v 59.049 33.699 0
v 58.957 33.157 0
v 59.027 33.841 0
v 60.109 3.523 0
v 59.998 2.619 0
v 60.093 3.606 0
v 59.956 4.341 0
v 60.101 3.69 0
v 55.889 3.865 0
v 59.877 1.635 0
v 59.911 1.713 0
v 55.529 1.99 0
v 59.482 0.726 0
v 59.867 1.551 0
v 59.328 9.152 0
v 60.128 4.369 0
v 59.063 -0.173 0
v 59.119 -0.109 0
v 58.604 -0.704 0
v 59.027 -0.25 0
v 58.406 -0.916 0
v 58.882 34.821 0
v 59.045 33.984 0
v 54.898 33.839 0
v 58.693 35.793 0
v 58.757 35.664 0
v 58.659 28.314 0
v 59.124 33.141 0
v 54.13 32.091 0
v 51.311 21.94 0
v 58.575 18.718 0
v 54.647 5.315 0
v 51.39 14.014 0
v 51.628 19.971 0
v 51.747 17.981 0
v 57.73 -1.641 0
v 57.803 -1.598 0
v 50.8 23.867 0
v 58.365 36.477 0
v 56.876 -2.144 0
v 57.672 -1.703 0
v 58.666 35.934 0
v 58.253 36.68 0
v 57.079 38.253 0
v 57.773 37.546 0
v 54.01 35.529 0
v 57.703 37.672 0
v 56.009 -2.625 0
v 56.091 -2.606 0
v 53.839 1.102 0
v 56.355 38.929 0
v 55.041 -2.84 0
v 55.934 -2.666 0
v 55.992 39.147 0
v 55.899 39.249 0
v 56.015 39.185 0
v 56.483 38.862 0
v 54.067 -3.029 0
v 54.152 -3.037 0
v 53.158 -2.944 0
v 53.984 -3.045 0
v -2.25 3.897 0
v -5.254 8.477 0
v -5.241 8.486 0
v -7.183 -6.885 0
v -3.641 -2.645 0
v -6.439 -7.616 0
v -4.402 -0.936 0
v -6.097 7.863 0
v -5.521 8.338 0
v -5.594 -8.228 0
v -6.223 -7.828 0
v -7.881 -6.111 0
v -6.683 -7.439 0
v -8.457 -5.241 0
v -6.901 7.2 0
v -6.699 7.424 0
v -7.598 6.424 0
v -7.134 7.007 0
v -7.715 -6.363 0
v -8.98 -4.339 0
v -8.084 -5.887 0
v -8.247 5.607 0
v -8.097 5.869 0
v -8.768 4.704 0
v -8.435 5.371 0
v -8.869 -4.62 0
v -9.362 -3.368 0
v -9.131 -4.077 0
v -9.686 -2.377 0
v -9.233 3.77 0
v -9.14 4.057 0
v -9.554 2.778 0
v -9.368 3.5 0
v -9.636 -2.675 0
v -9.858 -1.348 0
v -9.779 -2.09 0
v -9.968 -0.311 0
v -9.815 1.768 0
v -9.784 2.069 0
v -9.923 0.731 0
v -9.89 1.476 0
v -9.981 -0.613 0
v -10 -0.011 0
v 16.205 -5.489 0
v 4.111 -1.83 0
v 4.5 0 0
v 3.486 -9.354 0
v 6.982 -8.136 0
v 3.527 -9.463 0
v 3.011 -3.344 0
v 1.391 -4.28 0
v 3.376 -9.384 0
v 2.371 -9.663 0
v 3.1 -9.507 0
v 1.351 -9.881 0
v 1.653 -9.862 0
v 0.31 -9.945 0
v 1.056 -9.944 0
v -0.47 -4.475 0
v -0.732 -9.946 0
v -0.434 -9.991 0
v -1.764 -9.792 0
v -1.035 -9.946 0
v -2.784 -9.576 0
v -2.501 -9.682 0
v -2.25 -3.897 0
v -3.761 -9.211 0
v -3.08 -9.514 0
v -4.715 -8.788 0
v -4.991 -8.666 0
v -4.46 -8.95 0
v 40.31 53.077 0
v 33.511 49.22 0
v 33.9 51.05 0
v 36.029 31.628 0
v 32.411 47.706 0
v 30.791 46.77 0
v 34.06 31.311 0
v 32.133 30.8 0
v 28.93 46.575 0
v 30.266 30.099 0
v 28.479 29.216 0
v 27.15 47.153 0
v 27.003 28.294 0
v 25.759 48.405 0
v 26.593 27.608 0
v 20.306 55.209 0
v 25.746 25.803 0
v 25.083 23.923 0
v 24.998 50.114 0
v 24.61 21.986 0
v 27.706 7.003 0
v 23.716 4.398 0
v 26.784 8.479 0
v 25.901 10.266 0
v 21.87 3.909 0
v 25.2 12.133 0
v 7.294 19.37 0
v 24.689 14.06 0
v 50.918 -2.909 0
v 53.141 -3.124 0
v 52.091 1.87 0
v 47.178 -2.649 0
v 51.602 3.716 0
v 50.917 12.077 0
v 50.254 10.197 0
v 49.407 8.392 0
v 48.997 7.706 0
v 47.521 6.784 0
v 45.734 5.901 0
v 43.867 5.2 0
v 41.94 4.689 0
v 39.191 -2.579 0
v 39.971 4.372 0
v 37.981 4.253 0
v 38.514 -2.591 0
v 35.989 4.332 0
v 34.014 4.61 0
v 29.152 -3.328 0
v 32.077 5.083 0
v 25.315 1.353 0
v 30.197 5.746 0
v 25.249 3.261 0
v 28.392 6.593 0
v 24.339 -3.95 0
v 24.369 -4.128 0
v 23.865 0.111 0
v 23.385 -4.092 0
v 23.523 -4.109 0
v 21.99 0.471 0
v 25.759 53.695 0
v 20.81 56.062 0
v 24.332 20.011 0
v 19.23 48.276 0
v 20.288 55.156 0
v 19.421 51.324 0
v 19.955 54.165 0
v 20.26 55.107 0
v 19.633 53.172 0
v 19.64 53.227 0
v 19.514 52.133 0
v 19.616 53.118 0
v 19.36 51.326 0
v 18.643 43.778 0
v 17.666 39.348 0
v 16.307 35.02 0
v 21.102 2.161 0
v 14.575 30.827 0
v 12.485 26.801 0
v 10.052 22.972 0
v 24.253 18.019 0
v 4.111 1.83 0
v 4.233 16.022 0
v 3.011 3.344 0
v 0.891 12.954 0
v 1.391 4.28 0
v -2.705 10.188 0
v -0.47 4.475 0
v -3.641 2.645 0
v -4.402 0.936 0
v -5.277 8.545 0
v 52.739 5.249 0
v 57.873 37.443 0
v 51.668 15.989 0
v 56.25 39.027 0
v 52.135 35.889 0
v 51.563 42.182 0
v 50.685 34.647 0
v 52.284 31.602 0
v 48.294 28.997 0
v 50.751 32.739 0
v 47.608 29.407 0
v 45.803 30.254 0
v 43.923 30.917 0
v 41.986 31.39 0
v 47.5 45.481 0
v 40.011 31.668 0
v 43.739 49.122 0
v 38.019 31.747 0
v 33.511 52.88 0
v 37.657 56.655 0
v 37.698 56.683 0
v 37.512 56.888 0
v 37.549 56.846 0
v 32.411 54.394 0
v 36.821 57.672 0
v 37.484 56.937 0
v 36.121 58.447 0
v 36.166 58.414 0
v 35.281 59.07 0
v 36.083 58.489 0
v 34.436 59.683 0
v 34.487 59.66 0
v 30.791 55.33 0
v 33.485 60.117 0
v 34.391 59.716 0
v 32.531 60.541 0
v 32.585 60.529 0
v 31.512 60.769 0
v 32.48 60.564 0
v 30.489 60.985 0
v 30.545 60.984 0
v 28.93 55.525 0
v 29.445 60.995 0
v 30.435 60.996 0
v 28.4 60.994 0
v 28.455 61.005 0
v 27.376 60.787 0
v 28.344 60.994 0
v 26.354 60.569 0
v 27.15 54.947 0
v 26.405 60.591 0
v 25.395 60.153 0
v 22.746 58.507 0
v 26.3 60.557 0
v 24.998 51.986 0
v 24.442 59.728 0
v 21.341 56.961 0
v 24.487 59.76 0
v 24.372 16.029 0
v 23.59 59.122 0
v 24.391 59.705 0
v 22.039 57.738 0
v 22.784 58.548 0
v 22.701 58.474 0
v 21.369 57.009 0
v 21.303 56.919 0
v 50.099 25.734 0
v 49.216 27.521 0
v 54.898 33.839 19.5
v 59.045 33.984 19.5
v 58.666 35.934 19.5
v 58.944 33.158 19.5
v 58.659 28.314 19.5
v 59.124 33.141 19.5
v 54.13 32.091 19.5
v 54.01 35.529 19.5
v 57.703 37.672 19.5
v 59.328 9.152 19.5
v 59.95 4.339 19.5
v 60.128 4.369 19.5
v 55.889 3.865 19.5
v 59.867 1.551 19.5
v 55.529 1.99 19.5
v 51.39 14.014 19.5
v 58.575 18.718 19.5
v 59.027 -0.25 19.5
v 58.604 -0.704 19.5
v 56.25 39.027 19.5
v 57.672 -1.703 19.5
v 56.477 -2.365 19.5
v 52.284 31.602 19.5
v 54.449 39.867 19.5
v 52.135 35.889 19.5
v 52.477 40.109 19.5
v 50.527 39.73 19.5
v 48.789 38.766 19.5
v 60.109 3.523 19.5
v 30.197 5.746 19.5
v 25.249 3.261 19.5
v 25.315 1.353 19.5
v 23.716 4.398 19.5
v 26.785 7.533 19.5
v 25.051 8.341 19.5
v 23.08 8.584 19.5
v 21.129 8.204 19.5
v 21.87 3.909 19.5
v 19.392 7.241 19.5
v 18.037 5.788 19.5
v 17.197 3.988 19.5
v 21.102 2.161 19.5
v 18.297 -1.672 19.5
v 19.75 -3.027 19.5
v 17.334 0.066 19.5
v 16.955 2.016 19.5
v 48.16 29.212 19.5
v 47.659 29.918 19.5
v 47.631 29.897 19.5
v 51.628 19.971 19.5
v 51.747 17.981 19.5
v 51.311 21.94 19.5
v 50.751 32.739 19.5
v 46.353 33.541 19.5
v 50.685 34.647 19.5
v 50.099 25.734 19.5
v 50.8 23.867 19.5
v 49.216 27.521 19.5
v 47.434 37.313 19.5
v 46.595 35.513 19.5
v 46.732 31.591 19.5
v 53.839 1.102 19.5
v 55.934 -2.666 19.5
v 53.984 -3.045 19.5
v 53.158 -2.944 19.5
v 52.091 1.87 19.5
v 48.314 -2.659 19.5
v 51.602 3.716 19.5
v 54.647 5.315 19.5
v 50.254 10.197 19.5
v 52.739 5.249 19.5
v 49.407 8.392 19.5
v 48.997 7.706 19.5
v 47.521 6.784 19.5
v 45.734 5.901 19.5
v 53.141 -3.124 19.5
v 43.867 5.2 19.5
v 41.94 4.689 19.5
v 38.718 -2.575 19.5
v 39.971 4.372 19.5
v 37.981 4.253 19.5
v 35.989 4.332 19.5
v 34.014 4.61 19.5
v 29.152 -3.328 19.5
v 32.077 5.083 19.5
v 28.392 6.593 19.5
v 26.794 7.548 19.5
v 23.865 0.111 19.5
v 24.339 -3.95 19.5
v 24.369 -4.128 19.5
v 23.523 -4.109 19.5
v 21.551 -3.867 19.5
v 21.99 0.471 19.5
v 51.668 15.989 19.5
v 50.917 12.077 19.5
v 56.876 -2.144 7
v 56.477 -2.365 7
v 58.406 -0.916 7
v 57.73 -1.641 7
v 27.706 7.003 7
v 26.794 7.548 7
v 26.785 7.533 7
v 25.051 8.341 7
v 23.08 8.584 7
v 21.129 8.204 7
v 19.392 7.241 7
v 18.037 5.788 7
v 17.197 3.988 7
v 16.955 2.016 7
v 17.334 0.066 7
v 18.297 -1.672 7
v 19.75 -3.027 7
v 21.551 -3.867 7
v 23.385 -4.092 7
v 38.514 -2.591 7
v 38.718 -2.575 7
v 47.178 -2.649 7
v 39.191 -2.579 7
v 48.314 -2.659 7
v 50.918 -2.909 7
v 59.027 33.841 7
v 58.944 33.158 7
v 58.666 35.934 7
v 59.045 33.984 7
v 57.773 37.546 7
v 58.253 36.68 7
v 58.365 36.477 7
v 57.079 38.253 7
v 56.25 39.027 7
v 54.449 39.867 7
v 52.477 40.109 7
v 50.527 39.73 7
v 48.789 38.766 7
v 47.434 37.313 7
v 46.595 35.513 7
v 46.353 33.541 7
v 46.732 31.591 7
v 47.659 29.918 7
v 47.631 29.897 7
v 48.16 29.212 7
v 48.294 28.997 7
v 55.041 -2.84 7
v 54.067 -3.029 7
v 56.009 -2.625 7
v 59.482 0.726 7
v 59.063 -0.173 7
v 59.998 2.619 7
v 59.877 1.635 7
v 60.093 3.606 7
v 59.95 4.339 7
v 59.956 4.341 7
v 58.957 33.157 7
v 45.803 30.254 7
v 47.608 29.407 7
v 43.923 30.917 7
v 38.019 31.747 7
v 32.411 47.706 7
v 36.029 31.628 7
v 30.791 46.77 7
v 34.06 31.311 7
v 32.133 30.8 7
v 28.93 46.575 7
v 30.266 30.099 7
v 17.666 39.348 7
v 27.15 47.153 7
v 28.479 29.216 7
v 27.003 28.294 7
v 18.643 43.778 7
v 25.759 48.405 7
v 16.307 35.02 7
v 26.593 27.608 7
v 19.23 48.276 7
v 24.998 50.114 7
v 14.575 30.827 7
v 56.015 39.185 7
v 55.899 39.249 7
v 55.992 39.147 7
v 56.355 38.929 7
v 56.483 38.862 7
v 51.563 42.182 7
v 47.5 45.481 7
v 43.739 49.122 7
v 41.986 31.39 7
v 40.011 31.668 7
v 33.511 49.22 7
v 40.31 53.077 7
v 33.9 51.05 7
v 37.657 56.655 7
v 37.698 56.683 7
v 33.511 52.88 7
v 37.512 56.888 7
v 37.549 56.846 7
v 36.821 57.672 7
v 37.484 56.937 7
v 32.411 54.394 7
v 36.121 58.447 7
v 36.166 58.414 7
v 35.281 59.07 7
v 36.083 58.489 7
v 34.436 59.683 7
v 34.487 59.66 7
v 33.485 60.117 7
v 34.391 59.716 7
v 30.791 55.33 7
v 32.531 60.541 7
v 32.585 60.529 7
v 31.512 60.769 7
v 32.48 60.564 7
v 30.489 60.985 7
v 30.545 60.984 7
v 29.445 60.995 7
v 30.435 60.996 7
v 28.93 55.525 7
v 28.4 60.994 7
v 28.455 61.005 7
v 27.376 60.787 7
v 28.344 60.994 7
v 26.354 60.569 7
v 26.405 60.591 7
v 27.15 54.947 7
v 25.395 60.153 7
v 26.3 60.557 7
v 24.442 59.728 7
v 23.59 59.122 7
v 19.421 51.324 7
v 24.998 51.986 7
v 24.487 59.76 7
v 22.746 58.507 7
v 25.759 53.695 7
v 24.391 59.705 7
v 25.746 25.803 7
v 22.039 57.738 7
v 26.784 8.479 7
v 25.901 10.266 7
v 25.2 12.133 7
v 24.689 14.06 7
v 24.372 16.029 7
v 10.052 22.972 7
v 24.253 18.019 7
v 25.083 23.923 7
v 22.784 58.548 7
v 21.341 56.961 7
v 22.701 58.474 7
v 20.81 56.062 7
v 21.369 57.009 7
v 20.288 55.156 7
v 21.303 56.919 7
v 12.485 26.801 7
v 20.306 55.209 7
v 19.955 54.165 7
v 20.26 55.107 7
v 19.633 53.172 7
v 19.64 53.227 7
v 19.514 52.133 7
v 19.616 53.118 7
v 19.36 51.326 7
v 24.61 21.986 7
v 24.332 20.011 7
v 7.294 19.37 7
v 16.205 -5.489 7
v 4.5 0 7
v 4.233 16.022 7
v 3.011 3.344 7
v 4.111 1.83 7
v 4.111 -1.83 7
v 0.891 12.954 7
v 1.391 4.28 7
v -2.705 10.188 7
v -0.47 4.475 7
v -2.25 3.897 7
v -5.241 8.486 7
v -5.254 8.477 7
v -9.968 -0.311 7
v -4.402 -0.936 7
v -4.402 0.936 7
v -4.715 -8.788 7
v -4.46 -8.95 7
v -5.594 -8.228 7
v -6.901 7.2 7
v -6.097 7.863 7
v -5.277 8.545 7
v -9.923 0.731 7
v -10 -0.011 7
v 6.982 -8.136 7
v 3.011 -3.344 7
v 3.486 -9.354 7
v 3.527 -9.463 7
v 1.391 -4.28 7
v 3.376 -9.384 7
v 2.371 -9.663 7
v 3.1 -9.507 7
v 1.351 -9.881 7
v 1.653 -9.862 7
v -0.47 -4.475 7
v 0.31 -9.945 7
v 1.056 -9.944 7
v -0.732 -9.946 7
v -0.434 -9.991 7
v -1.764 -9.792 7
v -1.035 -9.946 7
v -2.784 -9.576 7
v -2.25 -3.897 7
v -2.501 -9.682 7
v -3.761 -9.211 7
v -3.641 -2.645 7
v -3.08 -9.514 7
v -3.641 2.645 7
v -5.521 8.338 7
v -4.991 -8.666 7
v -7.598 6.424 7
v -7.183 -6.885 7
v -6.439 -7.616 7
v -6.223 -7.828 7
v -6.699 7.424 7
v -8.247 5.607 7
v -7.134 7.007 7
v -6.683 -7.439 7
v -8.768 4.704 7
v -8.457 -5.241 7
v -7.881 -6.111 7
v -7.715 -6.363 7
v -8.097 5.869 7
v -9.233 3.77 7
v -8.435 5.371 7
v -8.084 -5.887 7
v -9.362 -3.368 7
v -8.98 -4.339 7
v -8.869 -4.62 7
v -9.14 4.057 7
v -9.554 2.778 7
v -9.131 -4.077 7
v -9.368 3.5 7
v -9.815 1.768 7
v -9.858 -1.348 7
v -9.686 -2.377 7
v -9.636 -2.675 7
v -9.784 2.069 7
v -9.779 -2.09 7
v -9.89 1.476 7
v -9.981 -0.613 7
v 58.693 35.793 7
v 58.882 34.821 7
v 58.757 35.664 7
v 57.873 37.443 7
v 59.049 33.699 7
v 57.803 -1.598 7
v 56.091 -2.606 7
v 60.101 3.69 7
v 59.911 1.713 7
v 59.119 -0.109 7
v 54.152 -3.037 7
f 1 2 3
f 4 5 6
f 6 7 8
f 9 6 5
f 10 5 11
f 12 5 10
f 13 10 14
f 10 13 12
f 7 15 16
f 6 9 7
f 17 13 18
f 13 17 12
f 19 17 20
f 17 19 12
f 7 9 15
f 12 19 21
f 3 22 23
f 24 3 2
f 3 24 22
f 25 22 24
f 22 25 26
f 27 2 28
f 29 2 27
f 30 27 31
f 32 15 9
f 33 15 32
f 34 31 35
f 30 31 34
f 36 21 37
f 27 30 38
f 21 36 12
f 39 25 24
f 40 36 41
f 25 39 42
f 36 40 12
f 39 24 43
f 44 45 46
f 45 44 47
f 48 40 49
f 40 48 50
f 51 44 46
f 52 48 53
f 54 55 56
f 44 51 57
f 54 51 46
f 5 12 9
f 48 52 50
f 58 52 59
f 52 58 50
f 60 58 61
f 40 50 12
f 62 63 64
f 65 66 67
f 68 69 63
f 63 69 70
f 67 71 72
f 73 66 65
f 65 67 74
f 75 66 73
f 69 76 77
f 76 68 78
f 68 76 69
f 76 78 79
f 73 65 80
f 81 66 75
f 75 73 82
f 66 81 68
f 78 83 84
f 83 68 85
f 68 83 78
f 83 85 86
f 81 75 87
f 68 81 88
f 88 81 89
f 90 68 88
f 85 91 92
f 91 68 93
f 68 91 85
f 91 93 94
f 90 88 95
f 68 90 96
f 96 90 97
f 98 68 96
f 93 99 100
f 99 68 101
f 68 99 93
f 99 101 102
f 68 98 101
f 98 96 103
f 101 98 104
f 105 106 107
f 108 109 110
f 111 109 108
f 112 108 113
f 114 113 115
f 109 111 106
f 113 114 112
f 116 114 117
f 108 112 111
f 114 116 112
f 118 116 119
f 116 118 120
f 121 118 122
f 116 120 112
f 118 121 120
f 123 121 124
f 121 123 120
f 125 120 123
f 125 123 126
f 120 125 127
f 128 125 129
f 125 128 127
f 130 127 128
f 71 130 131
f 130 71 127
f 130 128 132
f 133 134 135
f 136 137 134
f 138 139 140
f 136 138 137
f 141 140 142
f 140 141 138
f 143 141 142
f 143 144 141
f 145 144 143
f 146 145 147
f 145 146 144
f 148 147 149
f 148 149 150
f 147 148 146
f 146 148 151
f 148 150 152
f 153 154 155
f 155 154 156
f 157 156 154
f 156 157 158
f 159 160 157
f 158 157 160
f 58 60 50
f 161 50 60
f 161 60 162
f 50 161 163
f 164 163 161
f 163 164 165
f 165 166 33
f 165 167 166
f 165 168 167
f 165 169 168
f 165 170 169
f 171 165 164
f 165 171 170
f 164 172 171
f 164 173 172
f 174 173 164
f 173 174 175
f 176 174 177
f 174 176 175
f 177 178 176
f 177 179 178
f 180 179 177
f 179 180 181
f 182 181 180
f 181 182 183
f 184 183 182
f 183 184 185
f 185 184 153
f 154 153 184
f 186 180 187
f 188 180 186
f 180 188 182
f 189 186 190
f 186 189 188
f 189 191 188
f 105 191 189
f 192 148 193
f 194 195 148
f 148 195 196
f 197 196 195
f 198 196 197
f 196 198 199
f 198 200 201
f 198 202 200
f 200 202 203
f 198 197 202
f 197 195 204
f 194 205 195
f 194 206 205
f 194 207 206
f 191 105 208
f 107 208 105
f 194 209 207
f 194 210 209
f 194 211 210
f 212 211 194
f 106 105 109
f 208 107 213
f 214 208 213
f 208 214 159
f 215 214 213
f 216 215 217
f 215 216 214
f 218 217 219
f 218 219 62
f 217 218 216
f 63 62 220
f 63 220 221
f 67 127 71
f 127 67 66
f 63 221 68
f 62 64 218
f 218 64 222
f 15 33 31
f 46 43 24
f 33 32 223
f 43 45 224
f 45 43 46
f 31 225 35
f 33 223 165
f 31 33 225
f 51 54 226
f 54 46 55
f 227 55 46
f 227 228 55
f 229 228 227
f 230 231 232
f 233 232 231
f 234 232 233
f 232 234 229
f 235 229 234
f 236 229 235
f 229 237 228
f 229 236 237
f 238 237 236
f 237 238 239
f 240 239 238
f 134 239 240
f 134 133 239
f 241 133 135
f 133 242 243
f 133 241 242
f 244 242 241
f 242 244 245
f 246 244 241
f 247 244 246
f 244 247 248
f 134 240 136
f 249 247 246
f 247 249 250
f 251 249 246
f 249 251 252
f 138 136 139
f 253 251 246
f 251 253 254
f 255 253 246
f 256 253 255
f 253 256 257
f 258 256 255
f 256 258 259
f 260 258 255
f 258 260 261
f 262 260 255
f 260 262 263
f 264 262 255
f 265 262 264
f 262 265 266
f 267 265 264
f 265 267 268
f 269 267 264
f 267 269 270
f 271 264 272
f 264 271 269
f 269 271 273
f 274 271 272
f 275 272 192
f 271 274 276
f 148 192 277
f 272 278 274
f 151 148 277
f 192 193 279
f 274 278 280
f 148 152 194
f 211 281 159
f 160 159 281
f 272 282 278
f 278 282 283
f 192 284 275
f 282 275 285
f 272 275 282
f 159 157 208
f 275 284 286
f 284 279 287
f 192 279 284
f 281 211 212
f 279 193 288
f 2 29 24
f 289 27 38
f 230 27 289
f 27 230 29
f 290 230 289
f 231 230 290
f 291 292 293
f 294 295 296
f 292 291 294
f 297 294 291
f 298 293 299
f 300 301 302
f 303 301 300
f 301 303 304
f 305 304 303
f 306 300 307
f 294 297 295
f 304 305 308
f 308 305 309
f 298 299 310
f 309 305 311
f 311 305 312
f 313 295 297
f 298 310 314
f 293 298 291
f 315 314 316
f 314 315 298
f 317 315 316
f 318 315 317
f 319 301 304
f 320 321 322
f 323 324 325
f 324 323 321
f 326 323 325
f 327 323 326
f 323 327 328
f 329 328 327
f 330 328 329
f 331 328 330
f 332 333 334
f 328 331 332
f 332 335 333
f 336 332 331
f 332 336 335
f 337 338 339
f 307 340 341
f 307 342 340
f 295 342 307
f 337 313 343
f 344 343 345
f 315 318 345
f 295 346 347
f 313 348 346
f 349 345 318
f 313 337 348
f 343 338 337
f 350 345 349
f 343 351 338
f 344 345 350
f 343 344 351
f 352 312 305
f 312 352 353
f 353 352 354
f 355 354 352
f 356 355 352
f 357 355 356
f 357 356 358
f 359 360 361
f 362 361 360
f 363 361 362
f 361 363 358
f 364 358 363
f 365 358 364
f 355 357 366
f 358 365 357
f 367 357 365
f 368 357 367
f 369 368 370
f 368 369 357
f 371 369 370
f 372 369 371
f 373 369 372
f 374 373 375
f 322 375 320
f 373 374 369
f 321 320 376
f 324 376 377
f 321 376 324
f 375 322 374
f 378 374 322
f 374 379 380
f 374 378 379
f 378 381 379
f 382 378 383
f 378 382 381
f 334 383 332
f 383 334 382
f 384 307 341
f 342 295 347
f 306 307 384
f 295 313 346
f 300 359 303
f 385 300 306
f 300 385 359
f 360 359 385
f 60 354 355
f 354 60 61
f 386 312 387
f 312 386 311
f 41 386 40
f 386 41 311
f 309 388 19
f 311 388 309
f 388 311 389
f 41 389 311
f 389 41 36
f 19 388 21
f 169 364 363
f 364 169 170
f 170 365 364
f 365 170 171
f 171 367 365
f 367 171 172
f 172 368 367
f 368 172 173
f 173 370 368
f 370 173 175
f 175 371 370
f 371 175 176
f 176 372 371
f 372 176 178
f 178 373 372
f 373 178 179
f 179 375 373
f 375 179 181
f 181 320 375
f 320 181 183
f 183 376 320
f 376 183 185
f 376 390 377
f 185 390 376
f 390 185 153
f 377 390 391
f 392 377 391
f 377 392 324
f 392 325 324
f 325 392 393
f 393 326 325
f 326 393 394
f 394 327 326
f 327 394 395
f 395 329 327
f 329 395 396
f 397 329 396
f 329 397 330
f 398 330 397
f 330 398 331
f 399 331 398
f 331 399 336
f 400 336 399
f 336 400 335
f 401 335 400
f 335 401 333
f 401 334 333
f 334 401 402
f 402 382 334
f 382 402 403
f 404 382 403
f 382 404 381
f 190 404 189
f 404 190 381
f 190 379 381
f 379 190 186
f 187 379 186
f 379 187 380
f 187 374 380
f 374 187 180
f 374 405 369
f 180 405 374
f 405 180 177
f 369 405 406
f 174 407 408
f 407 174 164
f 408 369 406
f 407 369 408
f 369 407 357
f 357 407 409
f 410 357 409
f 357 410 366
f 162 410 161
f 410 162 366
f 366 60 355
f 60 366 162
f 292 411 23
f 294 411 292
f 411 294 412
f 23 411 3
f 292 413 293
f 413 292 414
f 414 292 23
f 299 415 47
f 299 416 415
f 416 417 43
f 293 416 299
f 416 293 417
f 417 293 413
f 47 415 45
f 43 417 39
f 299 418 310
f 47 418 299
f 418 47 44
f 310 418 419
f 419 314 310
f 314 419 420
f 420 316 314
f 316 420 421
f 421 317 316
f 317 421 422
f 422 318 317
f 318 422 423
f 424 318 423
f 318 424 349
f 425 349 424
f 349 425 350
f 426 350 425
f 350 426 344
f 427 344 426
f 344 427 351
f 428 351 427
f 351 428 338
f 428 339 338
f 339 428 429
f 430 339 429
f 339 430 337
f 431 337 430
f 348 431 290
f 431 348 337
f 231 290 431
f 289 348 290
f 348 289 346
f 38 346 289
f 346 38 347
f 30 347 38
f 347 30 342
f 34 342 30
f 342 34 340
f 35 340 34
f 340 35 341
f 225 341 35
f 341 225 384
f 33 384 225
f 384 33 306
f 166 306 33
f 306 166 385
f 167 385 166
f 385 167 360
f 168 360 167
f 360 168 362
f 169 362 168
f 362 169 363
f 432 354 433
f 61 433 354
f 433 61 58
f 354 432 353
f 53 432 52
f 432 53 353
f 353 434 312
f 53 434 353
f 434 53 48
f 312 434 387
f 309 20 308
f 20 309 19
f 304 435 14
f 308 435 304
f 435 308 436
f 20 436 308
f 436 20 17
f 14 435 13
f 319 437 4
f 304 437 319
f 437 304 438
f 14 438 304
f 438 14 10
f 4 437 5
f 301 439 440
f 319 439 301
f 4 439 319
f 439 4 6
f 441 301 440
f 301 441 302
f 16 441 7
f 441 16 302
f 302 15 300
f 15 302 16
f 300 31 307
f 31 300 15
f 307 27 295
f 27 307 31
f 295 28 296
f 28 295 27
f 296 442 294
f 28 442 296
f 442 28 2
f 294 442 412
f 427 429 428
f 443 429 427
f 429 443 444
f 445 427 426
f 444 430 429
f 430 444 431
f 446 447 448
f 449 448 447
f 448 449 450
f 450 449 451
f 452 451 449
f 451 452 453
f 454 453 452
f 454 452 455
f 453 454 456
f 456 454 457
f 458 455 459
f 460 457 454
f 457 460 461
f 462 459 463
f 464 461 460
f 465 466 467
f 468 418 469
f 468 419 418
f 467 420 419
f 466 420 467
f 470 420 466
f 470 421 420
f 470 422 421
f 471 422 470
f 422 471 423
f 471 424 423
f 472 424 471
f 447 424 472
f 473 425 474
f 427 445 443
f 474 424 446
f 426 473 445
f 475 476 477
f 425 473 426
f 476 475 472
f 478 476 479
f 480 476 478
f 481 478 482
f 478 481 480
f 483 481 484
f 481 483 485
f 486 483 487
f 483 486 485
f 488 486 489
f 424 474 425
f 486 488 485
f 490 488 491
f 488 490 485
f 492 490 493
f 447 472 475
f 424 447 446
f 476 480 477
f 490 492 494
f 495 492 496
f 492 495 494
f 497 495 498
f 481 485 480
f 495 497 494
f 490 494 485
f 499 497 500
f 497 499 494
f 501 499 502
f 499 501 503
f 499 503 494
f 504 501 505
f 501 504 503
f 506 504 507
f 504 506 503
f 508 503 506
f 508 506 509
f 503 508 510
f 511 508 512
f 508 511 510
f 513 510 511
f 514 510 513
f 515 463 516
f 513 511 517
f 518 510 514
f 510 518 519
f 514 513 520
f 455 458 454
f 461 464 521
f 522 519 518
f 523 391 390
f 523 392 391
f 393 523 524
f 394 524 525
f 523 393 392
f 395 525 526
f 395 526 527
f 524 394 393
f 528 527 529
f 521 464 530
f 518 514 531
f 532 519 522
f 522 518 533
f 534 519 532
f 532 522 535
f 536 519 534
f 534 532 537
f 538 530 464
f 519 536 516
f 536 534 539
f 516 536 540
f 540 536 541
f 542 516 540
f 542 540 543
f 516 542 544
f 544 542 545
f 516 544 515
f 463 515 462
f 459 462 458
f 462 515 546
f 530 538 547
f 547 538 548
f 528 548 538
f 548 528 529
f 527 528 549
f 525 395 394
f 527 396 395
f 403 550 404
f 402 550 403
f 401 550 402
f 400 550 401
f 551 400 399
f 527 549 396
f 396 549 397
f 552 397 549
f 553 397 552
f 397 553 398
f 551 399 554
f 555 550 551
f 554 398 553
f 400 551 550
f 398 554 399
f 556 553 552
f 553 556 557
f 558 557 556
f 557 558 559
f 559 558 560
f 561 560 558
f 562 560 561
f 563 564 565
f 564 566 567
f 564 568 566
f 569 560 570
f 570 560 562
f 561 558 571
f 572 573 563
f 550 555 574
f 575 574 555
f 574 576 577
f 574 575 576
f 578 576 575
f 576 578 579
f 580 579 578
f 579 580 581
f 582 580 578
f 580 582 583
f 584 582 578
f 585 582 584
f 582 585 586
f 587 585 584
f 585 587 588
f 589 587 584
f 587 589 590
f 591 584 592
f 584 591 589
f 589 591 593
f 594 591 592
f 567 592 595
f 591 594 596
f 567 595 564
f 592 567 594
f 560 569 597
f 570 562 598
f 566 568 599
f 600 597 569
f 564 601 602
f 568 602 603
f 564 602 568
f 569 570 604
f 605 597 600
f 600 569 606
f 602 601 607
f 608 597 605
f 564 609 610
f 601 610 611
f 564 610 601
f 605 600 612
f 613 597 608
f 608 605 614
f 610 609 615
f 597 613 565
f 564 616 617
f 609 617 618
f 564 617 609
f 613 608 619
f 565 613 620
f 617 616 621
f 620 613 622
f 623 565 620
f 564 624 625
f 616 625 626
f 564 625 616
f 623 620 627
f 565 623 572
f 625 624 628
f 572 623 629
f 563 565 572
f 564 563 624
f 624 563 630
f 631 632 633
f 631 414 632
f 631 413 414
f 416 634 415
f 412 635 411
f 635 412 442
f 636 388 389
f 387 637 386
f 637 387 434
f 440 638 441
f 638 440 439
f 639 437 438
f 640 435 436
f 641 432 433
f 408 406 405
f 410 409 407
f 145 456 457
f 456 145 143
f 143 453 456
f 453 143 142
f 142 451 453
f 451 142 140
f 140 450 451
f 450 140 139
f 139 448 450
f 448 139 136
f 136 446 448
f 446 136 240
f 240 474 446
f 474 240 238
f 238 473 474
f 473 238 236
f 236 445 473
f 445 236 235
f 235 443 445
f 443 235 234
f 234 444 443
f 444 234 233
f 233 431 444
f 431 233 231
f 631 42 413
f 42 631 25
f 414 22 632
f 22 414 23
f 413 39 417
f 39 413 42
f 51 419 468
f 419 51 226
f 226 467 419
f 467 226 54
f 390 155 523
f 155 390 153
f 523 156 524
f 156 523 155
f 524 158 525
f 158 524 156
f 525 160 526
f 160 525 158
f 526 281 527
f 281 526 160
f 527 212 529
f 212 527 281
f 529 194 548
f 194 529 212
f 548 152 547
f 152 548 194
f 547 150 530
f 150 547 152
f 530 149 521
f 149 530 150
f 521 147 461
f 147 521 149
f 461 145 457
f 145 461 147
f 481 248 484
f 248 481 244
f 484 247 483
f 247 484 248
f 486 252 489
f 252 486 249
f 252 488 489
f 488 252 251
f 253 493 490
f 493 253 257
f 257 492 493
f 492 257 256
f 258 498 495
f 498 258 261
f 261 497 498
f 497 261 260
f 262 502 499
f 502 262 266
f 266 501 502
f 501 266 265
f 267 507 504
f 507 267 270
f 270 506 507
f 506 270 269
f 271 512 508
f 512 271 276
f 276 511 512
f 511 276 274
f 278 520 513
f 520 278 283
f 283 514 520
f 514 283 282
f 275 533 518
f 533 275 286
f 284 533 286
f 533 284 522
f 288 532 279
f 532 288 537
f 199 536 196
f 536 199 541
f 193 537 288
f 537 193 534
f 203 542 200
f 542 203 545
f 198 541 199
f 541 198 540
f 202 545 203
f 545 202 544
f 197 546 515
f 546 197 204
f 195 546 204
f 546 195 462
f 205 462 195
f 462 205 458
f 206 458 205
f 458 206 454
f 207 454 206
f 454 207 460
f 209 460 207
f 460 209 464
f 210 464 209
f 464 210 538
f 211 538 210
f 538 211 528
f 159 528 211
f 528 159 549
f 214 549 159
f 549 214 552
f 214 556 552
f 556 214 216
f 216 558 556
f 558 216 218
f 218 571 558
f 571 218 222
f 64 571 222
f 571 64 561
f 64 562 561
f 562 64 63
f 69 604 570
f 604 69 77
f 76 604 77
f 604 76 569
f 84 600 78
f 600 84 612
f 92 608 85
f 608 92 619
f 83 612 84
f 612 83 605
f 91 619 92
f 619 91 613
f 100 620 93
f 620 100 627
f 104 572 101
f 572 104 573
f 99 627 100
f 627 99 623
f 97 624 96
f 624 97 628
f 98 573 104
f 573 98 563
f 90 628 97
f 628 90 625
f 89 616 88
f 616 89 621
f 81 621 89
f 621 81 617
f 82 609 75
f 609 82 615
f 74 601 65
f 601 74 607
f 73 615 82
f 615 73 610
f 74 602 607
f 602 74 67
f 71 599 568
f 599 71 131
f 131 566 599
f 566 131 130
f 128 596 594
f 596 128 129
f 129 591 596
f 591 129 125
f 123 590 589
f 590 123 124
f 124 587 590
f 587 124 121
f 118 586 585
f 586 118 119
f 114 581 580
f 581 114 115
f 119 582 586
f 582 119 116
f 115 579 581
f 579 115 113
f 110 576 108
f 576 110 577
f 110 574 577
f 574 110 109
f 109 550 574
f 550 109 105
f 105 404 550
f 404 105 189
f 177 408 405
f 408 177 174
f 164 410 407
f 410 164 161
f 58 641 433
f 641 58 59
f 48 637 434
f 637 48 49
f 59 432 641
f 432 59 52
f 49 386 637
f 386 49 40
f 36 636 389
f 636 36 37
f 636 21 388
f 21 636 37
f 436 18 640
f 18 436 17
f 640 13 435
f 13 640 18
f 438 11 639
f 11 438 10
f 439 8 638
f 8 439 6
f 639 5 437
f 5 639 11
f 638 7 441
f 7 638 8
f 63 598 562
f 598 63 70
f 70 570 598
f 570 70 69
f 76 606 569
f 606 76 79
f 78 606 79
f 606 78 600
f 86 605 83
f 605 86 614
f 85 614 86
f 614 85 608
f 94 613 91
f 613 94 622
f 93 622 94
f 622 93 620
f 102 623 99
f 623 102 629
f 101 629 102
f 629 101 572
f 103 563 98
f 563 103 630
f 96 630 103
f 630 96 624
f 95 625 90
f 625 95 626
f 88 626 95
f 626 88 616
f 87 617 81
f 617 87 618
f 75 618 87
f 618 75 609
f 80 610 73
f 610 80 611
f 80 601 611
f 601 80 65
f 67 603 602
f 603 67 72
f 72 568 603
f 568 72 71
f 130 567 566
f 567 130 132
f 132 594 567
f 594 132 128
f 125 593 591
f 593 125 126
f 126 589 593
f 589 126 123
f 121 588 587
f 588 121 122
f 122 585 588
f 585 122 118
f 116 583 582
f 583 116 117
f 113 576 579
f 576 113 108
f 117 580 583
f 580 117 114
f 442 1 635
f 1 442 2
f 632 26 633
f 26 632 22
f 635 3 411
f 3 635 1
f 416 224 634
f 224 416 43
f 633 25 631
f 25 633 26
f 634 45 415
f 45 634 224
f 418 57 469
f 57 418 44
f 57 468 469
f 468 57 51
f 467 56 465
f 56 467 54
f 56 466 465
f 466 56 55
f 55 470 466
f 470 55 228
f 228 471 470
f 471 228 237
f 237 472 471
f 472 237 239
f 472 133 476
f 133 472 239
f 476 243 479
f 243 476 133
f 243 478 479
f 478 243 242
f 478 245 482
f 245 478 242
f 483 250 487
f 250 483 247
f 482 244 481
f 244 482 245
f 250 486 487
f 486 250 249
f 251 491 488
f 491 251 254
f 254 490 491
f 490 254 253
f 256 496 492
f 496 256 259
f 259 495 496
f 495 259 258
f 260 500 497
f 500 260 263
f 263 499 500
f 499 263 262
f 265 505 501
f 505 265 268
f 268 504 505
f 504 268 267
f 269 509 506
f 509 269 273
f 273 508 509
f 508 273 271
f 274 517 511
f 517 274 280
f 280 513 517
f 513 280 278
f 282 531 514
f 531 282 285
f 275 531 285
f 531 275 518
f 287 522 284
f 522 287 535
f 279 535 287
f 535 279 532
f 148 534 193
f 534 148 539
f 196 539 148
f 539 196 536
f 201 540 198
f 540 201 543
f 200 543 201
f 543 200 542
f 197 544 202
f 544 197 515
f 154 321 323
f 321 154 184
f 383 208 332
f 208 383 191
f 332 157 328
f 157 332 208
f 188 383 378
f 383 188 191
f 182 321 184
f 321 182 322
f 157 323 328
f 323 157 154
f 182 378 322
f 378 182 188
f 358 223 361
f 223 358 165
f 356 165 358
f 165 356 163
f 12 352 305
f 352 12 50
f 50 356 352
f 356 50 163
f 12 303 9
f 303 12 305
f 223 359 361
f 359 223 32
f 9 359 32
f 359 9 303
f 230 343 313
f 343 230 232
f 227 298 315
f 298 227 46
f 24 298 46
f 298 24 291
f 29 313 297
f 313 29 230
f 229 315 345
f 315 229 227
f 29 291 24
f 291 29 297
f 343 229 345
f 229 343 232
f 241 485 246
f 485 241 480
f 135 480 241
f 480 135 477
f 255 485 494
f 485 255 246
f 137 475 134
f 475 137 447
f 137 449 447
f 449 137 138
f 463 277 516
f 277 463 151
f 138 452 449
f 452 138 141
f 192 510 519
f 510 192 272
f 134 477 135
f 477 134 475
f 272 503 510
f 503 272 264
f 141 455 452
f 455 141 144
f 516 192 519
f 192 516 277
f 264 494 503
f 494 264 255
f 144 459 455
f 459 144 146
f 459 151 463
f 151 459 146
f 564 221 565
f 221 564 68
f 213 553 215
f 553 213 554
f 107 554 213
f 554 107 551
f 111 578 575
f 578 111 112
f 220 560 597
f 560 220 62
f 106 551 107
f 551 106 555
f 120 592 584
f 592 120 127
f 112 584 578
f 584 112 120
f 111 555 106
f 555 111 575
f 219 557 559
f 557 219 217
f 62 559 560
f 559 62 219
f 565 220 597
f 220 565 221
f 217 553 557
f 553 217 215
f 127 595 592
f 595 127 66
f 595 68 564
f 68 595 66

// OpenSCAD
// file: functions.scad
// PRUSA Mendel  
// Functions used in many files
// GNU GPL v3
// Josef Průša
// josefprusa@me.com
// prusadjs.cz
// http://www.reprap.org/wiki/Prusa_Mendel
// http://github.com/prusajr/PrusaMendel


module nut(d,h,horizontal=true){
cornerdiameter =  (d / 2) / cos (180 / 6);
cylinder(h = h, r = cornerdiameter, $fn = 6);
if(horizontal){
for(i = [1:6]){
	rotate([0,0,60*i]) translate([-cornerdiameter-0.2,0,0]) rotate([0,0,-45]) cube(size = [2,2,h]);
}}
}

// Based on nophead research
module polyhole(d,h) {
    n = max(round(2 * d),3);
    rotate([0,0,180])
        cylinder(h = h, r = (d / 2) / cos (180 / n), $fn = n);
}




module roundcorner(diameter){
	difference(){
		cube(size = [diameter,diameter,99], center = false);
		translate(v = [diameter, diameter, 0]) cylinder(h = 100, r=diameter, center=true);
	}
}
// file: metric.scad
// PRUSA Mendel  
// Default metric sizes
// GNU GPL v3
// Josef Průša
// josefprusa@me.com
// prusadjs.cz
// http://www.reprap.org/wiki/Prusa_Mendel
// http://github.com/prusajr/PrusaMendel

// DONT CHANGE THIS FILE! ALTER VALUES IN CONFIGURATION.SCAD INSTEAD

// RODS

threaded_rod_diameter = 8.7;
threaded_rod_diameter_horizontal = 8.7;
smooth_bar_diameter = 8;
smooth_bar_diameter_horizontal = 8.5;

// Nuts and bolts

m8_diameter = 9;
m8_nut_diameter = 14.1;

m4_diameter = 4.5;
m4_nut_diameter = 9;

m3_diameter = 3.6;
m3_nut_diameter = 5.3;
m3_nut_diameter_horizontal = 6.1;

// Bushing holder

bushing_core_diameter = smooth_bar_diameter;
bushing_material_thickness = 1;

// Motors

motor_shaft = 5.5;
// file: configuration.scad
// PRUSA Mendel  
// Configuration file
// GNU GPL v3
// Josef Průša
// josefprusa@me.com
// prusadjs.cz
// http://www.reprap.org/wiki/Prusa_Mendel
// http://github.com/prusajr/PrusaMendel

// PLEASE SELECT ONE OF THE CONFIGURATIONS BELOW
// BY UN-COMMENTING IT

// Uncomment for metric settings
// METRIC METRIC METRIC METRIC METRIC METRIC METRIC METRIC 

include <metric.scad>;

// CUSTOM CUSTOM CUSTOM CUSTOM CUSTOM CUSTOM CUSTOM CUSTOM CUSTOM

thin_wall = 3;


// Linear bearing version
linear = false;
// set false for LM-8UU, true for LM-E-8UU (ignore if linear is set to false)
lme8uu = false;



// CHANGE ONLY THE STUFF YOU KNOW
// IT WILL REPLACE DEFAULT SETTING

// RODS

// threaded_rod_diameter = 0;
// threaded_rod_diameter_horizontal = 0;
// smooth_bar_diameter = 0;
// smooth_bar_diameter_horizontal = 0;

// Nuts and bolts

// m8_diameter = 0;
// m8_nut_diameter = 0;

// m4_diameter = 0;
// m4_nut_diameter = 0;

// m3_diameter = 0;
// m3_nut_diameter = 0;

// Bushing holder

// bushing_core_diameter = smooth_bar_diameter;
// bushing_material_thickness = 0;


///counted stuff
m3_nut_diameter_bigger = ((m3_nut_diameter  / 2) / cos (180 / 6))*2;

// functions 
include <functions.scad>
// main file
// PRUSA Mendel  
// Y motor bracket by Spacexula!!
// GNU GPL v2
// Josef Průša
// josefprusa@me.com
// prusadjs.cz
// http://www.reprap.org/wiki/Prusa_Mendel
// http://github.com/prusajr/PrusaMendel

include <configuration.scad>

/**
 *@name Y motor bracket
 *@link y-motor-bracket
 *@category Printed
 *@using 3 m3washer
 *@using 3 m3x10
 */ 

nema17_hole_spacing=1.2*25.4;
nema17_width=1.7*25.4;
thickness=7;
nema17_support_d=nema17_width-nema17_hole_spacing;
standoff=12.5;
full_height=thickness+standoff;
rod_surround_diameter=20;
top_rod_position=[29.4,51.05,0];
rod_centres_gap=sqrt(top_rod_position[0]*top_rod_position[0]+
				top_rod_position[1]*top_rod_position[1]);
motor_mount_position=[38,18,0];
mount_rotation=2;
motor_mount_rotation=[0,0,mount_rotation];

motor_mount1=rotated (-45+mount_rotation)*sqrt(2)*nema17_hole_spacing/2+motor_mount_position;
motor_mount2=rotated (45+mount_rotation)*sqrt(2)*nema17_hole_spacing/2+motor_mount_position;
top_offset=motor_mount2-top_rod_position;

//translate([0,0,1])%import_stl("gregs-ybrac-t.stl");

module ybract()
{
	
	// Motor supports.
	difference()
	{
		union()
		{
			//gap fill.
			translate([12,7,0])
#			cylinder(r=10,h=thickness);
			//gap fill.
			translate([33,40,0])
#			cylinder(r=5,h=thickness);

			rotate(atan2(top_rod_position[1],top_rod_position[0]))
			linear_extrude(height=thickness)
			barbell (rod_surround_diameter/2,rod_surround_diameter/2,52,280,rod_centres_gap);
		
			linear_extrude(height=thickness)
			rotate(atan2(motor_mount1[1],motor_mount1[0]))
			barbell (rod_surround_diameter/2,
				nema17_support_d/2,30,110,
				sqrt(motor_mount1[0]*motor_mount1[0]+motor_mount1[1]*motor_mount1[1]));
			
			linear_extrude(height=thickness)
			translate(top_rod_position)
			rotate(atan2(top_offset[1],top_offset[0]))
			barbell (rod_surround_diameter/2,
				nema17_support_d/2,60,60,
				sqrt(top_offset[0]*top_offset[0]+top_offset[1]*top_offset[1]));
	
			translate(motor_mount_position)
			rotate(motor_mount_rotation)
			{
				for (hole=[0:3])
					rotate([0,0,90*hole])
				linear_extrude(height=(hole>1)?thickness:full_height)
				translate(-nema17_hole_spacing*[1,1,0]/2)
				barbell (nema17_support_d/2,
					nema17_support_d/2,20,110,nema17_hole_spacing);

//				translate(nema17_hole_spacing*[-1,1,0]/2)
//				cylinder(r=nema17_support_d/2,h=full_height);
	
%				cube([nema17_width,nema17_width,0.1],true);
			}
		}

		// Motor mount holes.
		translate([0,0,-1])
		translate(motor_mount_position)
		rotate(motor_mount_rotation)
		{
			for (hole=[2:4])
			rotate([0,0,90*hole])
			translate(nema17_hole_spacing*[1,1,0]/2)
			cylinder(h=full_height+2,r=4.4/2);
		}
		
		// Rod holes.
		translate([29.4,51.05,-1])
		cylinder(h=full_height+2,r=m8_diameter/2);
		cylinder(h=full_height+2,r=m8_diameter/2);	
	}
}
ybract();

module barbell (r1,r2,r3,r4,separation)
{
	x1=[0,0];
	x2=[separation,0];
	x3=triangulate (x1,x2,r1+r3,r2+r3);
	x4=triangulate (x2,x1,r2+r4,r1+r4);
	
#	render()
	difference ()
	{
		union()
		{
			translate(x1)
			circle (r=r1);
			translate(x2)
			circle(r=r2);
		
			polygon (points=[x1,x3,x2,x4]);
		}

		translate(x3)
		circle(r=r3,$fa=5);
		translate(x4)
		circle(r=r4,$fa=5);
	}
}

function triangulate (point1, point2, length1, length2) = 
point1 + 
length1*rotated(
atan2(point2[1]-point1[1],point2[0]-point1[0])+
angle(distance(point1,point2),length1,length2));

function distance(point1,point2)=
sqrt((point1[0]-point2[0])*(point1[0]-point2[0])+
(point1[1]-point2[1])*(point1[1]-point2[1]));

function angle(a,b,c) = acos((a*a+b*b-c*c)/(2*a*b)); 

function rotated(a)=[cos(a),sin(a),0];
